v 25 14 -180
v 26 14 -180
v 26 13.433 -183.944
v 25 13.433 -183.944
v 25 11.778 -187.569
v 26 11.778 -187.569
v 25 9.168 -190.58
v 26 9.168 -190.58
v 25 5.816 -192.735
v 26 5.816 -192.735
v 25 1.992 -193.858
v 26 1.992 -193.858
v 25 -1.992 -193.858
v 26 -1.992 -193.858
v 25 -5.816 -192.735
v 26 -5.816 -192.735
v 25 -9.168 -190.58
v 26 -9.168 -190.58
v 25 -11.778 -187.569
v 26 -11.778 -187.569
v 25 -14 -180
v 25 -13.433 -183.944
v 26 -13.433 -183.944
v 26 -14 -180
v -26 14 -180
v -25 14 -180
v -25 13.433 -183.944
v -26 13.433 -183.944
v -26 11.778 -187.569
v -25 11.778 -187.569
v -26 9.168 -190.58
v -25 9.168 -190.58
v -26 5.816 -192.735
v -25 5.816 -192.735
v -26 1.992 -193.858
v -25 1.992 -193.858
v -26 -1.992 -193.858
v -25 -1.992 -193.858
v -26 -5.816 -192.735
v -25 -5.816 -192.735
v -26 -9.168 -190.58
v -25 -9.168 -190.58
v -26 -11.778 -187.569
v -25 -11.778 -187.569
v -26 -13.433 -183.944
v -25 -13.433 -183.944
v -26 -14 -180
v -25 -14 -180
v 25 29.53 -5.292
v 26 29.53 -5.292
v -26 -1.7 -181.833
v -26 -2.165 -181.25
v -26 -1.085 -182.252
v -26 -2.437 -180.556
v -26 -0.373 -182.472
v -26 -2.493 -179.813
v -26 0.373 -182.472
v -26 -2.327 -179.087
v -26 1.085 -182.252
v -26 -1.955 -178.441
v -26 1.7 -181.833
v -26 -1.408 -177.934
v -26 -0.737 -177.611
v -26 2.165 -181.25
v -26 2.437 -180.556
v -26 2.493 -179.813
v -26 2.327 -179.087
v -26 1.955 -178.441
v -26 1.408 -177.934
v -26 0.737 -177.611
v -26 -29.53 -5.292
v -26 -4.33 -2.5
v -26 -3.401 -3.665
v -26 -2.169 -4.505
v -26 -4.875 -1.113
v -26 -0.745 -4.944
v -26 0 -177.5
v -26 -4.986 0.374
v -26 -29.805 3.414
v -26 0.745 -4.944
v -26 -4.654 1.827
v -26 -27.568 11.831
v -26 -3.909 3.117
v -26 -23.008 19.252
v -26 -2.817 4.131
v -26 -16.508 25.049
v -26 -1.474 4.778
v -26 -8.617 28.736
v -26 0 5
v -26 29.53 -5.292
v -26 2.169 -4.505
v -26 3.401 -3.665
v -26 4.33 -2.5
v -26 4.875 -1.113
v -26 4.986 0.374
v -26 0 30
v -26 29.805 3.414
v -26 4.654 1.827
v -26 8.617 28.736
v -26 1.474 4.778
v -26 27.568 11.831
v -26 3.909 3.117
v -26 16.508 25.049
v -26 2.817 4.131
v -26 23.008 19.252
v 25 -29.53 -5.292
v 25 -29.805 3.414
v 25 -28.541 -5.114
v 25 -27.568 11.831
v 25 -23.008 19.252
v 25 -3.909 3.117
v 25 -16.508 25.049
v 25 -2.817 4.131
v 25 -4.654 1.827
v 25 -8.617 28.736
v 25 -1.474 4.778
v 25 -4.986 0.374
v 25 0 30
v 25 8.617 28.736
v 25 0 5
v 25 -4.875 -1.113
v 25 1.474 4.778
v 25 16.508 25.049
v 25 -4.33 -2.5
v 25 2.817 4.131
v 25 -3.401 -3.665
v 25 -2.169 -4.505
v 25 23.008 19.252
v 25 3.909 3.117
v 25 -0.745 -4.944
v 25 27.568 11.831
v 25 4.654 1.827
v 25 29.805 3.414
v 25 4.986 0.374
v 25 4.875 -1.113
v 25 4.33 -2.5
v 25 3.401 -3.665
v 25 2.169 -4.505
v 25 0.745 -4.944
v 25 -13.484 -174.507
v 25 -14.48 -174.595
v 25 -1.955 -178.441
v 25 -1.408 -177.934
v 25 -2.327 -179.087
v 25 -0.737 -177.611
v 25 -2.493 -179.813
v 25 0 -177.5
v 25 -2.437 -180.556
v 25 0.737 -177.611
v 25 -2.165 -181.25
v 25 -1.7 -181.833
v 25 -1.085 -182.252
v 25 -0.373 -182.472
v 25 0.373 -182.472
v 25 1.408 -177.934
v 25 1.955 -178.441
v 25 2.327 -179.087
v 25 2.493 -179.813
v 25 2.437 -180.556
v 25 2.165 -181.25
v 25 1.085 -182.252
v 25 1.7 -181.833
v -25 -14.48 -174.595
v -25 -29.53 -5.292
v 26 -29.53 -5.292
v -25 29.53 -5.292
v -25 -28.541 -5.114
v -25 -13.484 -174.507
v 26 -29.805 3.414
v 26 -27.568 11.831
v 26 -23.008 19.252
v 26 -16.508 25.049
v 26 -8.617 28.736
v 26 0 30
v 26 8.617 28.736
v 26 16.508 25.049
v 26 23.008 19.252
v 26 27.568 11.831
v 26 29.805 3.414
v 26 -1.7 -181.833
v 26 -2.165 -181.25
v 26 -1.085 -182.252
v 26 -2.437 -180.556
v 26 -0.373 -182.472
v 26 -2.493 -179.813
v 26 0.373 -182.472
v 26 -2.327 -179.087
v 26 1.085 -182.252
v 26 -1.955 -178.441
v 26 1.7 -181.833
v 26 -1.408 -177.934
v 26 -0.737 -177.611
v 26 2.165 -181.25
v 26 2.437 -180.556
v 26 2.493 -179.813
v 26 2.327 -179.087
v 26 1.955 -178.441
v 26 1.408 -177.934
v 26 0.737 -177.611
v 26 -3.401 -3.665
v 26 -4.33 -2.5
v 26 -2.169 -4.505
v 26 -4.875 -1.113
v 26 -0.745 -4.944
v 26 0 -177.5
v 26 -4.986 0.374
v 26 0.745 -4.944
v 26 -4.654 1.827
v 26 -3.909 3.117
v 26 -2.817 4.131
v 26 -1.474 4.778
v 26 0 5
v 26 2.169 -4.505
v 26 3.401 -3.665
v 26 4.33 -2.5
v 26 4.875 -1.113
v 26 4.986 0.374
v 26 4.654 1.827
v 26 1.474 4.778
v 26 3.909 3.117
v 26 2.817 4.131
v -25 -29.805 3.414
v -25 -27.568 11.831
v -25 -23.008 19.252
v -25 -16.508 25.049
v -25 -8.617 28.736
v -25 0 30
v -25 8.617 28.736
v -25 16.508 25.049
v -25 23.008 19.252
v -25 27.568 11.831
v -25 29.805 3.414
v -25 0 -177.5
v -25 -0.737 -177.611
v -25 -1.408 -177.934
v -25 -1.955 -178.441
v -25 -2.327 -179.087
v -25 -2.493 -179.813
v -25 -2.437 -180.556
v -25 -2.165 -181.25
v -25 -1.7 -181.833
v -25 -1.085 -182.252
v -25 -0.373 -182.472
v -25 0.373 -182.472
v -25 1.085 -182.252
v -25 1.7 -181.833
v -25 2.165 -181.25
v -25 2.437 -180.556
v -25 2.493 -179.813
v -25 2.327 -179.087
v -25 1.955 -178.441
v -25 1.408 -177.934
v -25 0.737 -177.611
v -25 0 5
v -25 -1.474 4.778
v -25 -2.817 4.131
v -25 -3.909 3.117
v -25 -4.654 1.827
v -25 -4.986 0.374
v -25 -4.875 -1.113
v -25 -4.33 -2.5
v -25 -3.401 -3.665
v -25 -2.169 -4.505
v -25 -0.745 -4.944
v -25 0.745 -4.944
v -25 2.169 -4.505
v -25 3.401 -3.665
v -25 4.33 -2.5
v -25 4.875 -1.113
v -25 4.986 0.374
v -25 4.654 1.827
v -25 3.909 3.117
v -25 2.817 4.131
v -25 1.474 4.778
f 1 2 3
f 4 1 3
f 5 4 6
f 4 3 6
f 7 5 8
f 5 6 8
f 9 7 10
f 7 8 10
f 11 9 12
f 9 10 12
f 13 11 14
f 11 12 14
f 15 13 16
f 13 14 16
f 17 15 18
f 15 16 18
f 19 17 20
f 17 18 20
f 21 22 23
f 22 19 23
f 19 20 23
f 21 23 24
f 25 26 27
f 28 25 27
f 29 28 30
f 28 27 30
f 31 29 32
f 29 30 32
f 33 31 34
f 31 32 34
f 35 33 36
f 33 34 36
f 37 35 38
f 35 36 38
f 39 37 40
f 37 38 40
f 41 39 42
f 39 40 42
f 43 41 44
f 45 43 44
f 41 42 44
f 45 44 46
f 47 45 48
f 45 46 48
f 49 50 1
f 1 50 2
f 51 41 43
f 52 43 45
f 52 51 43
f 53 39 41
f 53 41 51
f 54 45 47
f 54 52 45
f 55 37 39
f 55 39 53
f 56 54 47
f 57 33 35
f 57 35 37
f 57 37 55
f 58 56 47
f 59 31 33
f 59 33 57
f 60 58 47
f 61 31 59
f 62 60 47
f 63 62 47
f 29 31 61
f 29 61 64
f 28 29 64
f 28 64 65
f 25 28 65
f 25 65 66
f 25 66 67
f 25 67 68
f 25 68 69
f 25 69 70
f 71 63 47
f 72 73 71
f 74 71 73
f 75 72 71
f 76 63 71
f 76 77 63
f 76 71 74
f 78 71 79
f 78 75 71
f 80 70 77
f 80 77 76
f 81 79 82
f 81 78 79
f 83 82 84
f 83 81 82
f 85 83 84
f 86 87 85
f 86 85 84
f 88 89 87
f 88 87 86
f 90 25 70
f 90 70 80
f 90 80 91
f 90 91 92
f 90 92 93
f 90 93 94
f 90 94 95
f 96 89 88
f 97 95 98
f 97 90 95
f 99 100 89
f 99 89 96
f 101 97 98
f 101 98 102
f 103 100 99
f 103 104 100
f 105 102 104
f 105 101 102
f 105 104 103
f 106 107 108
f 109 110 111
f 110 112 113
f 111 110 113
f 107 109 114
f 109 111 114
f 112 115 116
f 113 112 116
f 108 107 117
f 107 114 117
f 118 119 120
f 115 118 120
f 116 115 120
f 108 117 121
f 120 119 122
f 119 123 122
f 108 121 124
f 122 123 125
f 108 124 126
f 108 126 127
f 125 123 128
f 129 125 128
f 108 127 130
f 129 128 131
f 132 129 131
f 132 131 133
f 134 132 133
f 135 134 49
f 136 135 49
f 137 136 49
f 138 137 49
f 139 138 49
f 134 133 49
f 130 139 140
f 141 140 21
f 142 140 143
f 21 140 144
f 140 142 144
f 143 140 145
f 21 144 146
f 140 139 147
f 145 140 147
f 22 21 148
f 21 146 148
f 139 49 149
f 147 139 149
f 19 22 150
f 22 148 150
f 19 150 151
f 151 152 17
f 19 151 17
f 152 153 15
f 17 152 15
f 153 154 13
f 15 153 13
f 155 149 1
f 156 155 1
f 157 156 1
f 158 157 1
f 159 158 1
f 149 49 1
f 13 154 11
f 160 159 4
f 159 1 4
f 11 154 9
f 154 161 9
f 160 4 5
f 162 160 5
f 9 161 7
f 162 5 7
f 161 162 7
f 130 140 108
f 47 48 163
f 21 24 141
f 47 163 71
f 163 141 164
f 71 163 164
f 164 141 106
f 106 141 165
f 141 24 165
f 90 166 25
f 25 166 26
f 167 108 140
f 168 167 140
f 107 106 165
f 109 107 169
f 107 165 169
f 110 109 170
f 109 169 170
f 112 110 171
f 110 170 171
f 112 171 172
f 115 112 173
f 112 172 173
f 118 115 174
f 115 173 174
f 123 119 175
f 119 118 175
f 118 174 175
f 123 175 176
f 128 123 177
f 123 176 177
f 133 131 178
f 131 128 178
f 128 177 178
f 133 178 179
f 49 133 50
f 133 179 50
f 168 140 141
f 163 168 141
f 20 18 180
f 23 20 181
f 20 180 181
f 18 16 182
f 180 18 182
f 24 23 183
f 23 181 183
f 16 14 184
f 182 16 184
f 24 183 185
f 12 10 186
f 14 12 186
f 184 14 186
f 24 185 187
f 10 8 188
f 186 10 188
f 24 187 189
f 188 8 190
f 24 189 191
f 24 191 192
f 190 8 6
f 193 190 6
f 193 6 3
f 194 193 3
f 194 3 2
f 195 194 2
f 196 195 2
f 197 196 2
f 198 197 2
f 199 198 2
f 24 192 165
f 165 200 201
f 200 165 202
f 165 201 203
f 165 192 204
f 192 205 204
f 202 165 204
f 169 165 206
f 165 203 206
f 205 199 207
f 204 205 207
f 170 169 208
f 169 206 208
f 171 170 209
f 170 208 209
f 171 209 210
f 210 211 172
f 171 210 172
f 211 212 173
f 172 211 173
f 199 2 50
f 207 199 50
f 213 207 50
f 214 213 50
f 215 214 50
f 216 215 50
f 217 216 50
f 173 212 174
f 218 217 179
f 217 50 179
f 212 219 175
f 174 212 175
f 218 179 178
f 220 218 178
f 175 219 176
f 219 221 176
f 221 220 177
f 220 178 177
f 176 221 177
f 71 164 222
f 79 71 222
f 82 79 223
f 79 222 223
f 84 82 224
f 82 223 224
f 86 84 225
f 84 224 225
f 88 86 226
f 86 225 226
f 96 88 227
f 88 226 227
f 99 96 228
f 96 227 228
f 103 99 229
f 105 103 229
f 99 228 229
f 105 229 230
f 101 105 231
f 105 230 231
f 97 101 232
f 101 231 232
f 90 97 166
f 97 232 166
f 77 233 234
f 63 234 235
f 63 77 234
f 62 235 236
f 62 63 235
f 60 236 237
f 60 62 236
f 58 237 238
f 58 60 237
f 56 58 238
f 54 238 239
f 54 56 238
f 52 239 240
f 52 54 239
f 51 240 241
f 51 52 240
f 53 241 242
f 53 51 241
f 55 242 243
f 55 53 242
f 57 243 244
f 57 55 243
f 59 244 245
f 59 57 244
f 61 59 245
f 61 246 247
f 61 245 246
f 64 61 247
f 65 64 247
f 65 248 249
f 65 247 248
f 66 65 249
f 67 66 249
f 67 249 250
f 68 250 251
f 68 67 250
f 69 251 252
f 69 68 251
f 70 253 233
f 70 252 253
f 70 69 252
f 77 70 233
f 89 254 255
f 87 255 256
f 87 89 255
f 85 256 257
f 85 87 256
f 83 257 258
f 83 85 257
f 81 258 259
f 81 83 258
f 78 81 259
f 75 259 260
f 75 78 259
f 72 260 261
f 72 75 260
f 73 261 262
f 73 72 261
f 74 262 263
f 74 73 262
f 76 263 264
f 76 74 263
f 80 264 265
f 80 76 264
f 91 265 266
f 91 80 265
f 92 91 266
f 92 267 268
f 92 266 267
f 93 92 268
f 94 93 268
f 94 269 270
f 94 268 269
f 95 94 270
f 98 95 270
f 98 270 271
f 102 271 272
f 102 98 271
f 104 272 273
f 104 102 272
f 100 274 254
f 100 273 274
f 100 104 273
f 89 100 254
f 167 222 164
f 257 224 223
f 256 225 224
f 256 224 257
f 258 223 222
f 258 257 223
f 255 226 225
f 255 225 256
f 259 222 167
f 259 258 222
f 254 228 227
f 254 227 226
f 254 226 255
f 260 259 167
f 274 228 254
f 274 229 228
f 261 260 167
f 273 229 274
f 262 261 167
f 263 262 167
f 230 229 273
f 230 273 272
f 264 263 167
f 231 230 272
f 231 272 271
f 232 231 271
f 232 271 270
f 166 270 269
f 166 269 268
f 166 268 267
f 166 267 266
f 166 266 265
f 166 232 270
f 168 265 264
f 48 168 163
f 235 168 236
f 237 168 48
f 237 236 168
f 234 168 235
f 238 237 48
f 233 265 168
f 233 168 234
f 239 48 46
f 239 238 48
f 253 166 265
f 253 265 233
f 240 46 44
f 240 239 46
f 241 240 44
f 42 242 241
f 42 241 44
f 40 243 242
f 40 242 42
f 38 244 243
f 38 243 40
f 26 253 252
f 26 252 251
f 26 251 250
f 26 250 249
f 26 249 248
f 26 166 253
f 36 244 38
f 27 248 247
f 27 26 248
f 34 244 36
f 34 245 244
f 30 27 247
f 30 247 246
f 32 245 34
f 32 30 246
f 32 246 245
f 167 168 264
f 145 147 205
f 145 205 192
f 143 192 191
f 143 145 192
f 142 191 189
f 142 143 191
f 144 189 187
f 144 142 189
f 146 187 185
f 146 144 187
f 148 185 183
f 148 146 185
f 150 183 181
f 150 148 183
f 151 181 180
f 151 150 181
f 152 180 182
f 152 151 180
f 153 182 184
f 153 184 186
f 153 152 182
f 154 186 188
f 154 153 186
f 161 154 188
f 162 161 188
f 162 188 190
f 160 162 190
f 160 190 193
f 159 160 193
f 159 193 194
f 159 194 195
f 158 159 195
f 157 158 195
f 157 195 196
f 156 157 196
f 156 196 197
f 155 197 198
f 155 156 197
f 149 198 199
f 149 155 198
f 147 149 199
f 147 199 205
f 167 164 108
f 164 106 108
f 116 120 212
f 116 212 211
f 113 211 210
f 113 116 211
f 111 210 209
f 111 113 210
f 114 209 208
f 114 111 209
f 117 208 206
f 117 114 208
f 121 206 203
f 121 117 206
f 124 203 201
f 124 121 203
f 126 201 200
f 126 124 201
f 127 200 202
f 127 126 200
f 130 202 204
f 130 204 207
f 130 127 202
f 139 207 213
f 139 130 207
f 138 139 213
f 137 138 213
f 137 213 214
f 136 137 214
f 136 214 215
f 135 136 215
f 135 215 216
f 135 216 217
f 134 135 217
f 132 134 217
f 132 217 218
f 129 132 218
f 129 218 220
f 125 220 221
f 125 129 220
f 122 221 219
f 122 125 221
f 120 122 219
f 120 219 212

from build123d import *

# Parameters (mm, degrees)
SKETCH1_R           = 5
SKETCH1_R_2         = 2.5
BOSS_EXTRUDE1_DEPTH = 26
CUT_EXTRUDE1_DEPTH  = 25


with BuildPart() as part:
    # Sketch1 → Boss-Extrude1 (new, symmetric)
    with BuildSketch(Plane(origin=(0, 0, 0), x_dir=(0, 0, -1), z_dir=(1, 0, 0))):
        with BuildLine():
            Line((5.291523763, 29.529642332), (180, 14))
            ThreePointArc((180, 14), (194, 0), (180, -14))
            Line((180, -14), (5.291523763, -29.529642332))
            ThreePointArc((5.291523763, -29.529642332), (-30, 0), (5.291523763, 29.529642332))
        make_face()
        with Locations(Location((0, 0, 0), (0, 0, 180))):
            Circle(SKETCH1_R, mode=Mode.SUBTRACT)
        with Locations(Location((180, 0, 0), (0, 0, 180))):
            Circle(SKETCH1_R_2, mode=Mode.SUBTRACT)
    extrude(amount=BOSS_EXTRUDE1_DEPTH, both=True)

    # Sketch2 → Cut-Extrude1 (cut, symmetric)
    with BuildSketch(Plane(origin=(0, 0, 0), x_dir=(0, 0, -1), z_dir=(1, 0, 0))):
        with BuildLine():
            Line((5.291523763, -29.529642332), (5.114444182, -28.541439895))
            Line((5.114444182, -28.541439895), (174.506520913, -13.484366408))
            Line((174.506520913, -13.484366408), (174.595060704, -14.480439049))
            Line((174.595060704, -14.480439049), (180, -14))
            ThreePointArc((180, -14), (194, 0), (180, 14))
            Line((180, 14), (5.291523763, 29.529642332))
            ThreePointArc((5.291523763, 29.529642332), (-30, 0), (5.291523763, -29.529642332))
        make_face()
    extrude(amount=CUT_EXTRUDE1_DEPTH, both=True, mode=Mode.SUBTRACT)


solid = part.part
